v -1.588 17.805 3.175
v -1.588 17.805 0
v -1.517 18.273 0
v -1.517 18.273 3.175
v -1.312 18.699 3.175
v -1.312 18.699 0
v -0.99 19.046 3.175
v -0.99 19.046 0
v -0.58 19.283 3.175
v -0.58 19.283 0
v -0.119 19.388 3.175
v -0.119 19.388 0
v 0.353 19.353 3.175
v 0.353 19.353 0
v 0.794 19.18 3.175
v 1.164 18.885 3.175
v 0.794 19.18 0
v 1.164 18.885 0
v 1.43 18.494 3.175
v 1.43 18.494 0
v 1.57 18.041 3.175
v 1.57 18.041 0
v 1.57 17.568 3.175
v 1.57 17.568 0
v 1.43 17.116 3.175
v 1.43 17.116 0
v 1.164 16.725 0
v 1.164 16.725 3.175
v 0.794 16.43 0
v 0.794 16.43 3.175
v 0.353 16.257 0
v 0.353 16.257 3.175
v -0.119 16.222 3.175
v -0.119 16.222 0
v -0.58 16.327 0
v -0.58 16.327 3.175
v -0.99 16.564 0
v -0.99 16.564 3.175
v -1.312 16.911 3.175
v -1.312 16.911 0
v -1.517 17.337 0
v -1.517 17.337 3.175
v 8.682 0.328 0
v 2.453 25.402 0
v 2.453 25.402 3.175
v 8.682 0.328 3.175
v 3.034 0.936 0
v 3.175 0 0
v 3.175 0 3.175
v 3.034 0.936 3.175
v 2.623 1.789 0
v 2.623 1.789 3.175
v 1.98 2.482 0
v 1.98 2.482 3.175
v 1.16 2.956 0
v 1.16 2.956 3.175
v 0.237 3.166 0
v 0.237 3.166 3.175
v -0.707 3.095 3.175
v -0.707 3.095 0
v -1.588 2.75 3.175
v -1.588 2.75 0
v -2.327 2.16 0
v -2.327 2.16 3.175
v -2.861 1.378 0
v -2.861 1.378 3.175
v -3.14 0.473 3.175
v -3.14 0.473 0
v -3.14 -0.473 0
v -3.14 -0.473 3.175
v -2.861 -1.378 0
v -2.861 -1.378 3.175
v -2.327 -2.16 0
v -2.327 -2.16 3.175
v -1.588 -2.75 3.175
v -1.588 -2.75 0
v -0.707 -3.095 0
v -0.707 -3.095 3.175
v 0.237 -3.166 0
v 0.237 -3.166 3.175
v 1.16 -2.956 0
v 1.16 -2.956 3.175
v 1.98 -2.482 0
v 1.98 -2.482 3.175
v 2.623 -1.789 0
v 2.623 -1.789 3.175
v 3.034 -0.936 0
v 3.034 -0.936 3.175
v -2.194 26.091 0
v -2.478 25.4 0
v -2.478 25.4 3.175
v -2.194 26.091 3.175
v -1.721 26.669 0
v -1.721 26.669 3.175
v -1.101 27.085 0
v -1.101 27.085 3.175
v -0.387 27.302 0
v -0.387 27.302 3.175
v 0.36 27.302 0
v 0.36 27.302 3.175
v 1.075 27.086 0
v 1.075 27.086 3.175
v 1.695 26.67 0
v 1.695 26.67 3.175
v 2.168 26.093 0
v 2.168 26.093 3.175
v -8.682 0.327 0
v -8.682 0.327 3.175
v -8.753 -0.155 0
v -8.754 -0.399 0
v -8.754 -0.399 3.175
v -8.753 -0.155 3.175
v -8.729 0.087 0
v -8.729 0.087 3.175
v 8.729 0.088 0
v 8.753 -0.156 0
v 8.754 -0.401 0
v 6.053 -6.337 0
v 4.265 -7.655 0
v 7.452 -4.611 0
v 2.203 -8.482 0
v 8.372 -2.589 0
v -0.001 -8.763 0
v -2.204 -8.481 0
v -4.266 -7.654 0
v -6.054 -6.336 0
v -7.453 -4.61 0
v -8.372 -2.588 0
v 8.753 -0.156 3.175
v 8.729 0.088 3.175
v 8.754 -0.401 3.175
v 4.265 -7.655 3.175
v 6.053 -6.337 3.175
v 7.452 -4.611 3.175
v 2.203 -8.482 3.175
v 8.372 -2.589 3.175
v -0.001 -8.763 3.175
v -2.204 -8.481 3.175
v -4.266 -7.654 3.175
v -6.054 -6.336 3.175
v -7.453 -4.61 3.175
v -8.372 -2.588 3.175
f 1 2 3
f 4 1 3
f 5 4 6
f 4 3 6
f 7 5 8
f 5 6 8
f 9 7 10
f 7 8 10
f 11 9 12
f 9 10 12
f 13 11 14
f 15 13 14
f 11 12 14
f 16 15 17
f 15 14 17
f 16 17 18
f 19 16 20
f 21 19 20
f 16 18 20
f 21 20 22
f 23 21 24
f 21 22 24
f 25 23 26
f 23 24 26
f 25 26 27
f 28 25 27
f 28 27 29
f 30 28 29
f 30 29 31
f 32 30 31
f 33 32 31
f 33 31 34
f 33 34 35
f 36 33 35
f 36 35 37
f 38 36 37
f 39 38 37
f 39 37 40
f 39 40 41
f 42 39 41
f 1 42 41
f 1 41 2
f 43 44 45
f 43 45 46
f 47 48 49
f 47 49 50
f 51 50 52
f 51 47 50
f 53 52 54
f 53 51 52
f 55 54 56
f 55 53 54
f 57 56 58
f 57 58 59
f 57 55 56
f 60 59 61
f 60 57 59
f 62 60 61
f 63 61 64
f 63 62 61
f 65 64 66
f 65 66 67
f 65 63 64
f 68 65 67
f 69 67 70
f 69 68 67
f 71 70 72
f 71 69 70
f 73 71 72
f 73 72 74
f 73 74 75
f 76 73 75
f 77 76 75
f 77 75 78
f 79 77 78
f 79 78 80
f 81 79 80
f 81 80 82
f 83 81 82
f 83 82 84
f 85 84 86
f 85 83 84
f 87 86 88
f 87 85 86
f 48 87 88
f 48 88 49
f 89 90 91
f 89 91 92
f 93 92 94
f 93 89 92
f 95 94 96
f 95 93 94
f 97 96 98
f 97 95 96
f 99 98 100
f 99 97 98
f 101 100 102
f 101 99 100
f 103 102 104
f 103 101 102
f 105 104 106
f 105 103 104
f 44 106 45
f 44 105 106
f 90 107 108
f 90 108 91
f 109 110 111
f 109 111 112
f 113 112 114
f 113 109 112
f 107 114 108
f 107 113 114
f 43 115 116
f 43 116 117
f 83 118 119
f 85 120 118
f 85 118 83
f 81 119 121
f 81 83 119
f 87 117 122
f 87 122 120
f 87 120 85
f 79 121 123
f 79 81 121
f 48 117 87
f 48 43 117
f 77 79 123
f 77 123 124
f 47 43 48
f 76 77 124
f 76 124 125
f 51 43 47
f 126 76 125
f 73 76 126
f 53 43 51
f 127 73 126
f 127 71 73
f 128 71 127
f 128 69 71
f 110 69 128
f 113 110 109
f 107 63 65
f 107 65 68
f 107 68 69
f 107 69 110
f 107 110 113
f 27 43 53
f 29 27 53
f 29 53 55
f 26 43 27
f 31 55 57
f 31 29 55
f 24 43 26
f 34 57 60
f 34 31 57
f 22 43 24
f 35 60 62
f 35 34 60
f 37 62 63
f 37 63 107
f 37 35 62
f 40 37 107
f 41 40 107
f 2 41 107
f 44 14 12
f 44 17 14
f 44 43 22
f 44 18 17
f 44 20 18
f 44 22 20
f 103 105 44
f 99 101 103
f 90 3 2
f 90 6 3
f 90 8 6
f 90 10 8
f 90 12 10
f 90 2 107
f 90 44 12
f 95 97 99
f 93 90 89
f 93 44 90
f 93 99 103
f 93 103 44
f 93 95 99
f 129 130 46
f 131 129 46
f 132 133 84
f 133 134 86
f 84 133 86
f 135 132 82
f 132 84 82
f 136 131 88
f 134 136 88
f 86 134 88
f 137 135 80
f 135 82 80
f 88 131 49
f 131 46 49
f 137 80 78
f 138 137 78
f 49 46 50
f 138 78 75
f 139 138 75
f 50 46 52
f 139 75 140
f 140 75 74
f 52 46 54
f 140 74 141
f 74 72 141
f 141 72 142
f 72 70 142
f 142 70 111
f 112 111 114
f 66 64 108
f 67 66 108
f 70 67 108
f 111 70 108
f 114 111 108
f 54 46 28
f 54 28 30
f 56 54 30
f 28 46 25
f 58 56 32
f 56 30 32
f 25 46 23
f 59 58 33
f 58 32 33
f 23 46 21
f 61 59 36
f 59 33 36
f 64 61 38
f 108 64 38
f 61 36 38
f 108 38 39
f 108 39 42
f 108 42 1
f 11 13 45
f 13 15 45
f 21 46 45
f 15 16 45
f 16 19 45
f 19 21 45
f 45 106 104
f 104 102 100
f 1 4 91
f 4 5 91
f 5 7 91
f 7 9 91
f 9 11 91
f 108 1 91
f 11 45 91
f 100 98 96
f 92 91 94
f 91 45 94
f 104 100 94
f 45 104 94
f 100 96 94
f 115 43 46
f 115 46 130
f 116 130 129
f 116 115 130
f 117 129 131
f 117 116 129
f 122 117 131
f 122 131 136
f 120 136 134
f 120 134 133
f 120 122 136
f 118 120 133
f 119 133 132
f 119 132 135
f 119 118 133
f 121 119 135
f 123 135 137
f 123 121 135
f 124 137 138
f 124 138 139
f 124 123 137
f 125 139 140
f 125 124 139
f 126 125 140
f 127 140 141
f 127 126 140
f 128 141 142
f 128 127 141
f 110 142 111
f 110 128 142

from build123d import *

# Parameters (mm, degrees)
SKETCH1_R                    = 3.175
BOSS_EXTRUDE1_DEPTH          = 3.175
F_1_8_0_125_DIAMETER_HOLE1_D = 3.175


with BuildPart() as part:
    # Sketch1 → Boss-Extrude1 (new body)
    with BuildSketch(Plane.XY):
        with BuildLine():
            Line((-8.682173031, 0.326637814), (-2.477735609, 25.4))
            ThreePointArc((-2.477735609, 25.4), (-0.013242247, 27.329875409), (2.45298258, 25.402213164))
            Line((2.45298258, 25.402213164), (8.681575809, 0.327789055))
            ThreePointArc((8.681575809, 0.327789055), (8.744087205, -0.033833939), (8.753834359, -0.400690665))
            ThreePointArc((8.753834359, -0.400690665), (-0.00074846, -8.762999968), (-8.753902679, -0.399195305))
            ThreePointArc((-8.753902679, -0.399195305), (-8.744226674, -0.033690664), (-8.682173031, 0.326637814))
        make_face()
        Circle(SKETCH1_R, mode=Mode.SUBTRACT)
    extrude(amount=BOSS_EXTRUDE1_DEPTH)

    # 1/8 (0.125) Diameter Hole1 (through all)
    with Locations(Plane.XY.offset(3.175)):
        with Locations((0, 17.804875409)):
            Hole(F_1_8_0_125_DIAMETER_HOLE1_D / 2)


solid = part.part
